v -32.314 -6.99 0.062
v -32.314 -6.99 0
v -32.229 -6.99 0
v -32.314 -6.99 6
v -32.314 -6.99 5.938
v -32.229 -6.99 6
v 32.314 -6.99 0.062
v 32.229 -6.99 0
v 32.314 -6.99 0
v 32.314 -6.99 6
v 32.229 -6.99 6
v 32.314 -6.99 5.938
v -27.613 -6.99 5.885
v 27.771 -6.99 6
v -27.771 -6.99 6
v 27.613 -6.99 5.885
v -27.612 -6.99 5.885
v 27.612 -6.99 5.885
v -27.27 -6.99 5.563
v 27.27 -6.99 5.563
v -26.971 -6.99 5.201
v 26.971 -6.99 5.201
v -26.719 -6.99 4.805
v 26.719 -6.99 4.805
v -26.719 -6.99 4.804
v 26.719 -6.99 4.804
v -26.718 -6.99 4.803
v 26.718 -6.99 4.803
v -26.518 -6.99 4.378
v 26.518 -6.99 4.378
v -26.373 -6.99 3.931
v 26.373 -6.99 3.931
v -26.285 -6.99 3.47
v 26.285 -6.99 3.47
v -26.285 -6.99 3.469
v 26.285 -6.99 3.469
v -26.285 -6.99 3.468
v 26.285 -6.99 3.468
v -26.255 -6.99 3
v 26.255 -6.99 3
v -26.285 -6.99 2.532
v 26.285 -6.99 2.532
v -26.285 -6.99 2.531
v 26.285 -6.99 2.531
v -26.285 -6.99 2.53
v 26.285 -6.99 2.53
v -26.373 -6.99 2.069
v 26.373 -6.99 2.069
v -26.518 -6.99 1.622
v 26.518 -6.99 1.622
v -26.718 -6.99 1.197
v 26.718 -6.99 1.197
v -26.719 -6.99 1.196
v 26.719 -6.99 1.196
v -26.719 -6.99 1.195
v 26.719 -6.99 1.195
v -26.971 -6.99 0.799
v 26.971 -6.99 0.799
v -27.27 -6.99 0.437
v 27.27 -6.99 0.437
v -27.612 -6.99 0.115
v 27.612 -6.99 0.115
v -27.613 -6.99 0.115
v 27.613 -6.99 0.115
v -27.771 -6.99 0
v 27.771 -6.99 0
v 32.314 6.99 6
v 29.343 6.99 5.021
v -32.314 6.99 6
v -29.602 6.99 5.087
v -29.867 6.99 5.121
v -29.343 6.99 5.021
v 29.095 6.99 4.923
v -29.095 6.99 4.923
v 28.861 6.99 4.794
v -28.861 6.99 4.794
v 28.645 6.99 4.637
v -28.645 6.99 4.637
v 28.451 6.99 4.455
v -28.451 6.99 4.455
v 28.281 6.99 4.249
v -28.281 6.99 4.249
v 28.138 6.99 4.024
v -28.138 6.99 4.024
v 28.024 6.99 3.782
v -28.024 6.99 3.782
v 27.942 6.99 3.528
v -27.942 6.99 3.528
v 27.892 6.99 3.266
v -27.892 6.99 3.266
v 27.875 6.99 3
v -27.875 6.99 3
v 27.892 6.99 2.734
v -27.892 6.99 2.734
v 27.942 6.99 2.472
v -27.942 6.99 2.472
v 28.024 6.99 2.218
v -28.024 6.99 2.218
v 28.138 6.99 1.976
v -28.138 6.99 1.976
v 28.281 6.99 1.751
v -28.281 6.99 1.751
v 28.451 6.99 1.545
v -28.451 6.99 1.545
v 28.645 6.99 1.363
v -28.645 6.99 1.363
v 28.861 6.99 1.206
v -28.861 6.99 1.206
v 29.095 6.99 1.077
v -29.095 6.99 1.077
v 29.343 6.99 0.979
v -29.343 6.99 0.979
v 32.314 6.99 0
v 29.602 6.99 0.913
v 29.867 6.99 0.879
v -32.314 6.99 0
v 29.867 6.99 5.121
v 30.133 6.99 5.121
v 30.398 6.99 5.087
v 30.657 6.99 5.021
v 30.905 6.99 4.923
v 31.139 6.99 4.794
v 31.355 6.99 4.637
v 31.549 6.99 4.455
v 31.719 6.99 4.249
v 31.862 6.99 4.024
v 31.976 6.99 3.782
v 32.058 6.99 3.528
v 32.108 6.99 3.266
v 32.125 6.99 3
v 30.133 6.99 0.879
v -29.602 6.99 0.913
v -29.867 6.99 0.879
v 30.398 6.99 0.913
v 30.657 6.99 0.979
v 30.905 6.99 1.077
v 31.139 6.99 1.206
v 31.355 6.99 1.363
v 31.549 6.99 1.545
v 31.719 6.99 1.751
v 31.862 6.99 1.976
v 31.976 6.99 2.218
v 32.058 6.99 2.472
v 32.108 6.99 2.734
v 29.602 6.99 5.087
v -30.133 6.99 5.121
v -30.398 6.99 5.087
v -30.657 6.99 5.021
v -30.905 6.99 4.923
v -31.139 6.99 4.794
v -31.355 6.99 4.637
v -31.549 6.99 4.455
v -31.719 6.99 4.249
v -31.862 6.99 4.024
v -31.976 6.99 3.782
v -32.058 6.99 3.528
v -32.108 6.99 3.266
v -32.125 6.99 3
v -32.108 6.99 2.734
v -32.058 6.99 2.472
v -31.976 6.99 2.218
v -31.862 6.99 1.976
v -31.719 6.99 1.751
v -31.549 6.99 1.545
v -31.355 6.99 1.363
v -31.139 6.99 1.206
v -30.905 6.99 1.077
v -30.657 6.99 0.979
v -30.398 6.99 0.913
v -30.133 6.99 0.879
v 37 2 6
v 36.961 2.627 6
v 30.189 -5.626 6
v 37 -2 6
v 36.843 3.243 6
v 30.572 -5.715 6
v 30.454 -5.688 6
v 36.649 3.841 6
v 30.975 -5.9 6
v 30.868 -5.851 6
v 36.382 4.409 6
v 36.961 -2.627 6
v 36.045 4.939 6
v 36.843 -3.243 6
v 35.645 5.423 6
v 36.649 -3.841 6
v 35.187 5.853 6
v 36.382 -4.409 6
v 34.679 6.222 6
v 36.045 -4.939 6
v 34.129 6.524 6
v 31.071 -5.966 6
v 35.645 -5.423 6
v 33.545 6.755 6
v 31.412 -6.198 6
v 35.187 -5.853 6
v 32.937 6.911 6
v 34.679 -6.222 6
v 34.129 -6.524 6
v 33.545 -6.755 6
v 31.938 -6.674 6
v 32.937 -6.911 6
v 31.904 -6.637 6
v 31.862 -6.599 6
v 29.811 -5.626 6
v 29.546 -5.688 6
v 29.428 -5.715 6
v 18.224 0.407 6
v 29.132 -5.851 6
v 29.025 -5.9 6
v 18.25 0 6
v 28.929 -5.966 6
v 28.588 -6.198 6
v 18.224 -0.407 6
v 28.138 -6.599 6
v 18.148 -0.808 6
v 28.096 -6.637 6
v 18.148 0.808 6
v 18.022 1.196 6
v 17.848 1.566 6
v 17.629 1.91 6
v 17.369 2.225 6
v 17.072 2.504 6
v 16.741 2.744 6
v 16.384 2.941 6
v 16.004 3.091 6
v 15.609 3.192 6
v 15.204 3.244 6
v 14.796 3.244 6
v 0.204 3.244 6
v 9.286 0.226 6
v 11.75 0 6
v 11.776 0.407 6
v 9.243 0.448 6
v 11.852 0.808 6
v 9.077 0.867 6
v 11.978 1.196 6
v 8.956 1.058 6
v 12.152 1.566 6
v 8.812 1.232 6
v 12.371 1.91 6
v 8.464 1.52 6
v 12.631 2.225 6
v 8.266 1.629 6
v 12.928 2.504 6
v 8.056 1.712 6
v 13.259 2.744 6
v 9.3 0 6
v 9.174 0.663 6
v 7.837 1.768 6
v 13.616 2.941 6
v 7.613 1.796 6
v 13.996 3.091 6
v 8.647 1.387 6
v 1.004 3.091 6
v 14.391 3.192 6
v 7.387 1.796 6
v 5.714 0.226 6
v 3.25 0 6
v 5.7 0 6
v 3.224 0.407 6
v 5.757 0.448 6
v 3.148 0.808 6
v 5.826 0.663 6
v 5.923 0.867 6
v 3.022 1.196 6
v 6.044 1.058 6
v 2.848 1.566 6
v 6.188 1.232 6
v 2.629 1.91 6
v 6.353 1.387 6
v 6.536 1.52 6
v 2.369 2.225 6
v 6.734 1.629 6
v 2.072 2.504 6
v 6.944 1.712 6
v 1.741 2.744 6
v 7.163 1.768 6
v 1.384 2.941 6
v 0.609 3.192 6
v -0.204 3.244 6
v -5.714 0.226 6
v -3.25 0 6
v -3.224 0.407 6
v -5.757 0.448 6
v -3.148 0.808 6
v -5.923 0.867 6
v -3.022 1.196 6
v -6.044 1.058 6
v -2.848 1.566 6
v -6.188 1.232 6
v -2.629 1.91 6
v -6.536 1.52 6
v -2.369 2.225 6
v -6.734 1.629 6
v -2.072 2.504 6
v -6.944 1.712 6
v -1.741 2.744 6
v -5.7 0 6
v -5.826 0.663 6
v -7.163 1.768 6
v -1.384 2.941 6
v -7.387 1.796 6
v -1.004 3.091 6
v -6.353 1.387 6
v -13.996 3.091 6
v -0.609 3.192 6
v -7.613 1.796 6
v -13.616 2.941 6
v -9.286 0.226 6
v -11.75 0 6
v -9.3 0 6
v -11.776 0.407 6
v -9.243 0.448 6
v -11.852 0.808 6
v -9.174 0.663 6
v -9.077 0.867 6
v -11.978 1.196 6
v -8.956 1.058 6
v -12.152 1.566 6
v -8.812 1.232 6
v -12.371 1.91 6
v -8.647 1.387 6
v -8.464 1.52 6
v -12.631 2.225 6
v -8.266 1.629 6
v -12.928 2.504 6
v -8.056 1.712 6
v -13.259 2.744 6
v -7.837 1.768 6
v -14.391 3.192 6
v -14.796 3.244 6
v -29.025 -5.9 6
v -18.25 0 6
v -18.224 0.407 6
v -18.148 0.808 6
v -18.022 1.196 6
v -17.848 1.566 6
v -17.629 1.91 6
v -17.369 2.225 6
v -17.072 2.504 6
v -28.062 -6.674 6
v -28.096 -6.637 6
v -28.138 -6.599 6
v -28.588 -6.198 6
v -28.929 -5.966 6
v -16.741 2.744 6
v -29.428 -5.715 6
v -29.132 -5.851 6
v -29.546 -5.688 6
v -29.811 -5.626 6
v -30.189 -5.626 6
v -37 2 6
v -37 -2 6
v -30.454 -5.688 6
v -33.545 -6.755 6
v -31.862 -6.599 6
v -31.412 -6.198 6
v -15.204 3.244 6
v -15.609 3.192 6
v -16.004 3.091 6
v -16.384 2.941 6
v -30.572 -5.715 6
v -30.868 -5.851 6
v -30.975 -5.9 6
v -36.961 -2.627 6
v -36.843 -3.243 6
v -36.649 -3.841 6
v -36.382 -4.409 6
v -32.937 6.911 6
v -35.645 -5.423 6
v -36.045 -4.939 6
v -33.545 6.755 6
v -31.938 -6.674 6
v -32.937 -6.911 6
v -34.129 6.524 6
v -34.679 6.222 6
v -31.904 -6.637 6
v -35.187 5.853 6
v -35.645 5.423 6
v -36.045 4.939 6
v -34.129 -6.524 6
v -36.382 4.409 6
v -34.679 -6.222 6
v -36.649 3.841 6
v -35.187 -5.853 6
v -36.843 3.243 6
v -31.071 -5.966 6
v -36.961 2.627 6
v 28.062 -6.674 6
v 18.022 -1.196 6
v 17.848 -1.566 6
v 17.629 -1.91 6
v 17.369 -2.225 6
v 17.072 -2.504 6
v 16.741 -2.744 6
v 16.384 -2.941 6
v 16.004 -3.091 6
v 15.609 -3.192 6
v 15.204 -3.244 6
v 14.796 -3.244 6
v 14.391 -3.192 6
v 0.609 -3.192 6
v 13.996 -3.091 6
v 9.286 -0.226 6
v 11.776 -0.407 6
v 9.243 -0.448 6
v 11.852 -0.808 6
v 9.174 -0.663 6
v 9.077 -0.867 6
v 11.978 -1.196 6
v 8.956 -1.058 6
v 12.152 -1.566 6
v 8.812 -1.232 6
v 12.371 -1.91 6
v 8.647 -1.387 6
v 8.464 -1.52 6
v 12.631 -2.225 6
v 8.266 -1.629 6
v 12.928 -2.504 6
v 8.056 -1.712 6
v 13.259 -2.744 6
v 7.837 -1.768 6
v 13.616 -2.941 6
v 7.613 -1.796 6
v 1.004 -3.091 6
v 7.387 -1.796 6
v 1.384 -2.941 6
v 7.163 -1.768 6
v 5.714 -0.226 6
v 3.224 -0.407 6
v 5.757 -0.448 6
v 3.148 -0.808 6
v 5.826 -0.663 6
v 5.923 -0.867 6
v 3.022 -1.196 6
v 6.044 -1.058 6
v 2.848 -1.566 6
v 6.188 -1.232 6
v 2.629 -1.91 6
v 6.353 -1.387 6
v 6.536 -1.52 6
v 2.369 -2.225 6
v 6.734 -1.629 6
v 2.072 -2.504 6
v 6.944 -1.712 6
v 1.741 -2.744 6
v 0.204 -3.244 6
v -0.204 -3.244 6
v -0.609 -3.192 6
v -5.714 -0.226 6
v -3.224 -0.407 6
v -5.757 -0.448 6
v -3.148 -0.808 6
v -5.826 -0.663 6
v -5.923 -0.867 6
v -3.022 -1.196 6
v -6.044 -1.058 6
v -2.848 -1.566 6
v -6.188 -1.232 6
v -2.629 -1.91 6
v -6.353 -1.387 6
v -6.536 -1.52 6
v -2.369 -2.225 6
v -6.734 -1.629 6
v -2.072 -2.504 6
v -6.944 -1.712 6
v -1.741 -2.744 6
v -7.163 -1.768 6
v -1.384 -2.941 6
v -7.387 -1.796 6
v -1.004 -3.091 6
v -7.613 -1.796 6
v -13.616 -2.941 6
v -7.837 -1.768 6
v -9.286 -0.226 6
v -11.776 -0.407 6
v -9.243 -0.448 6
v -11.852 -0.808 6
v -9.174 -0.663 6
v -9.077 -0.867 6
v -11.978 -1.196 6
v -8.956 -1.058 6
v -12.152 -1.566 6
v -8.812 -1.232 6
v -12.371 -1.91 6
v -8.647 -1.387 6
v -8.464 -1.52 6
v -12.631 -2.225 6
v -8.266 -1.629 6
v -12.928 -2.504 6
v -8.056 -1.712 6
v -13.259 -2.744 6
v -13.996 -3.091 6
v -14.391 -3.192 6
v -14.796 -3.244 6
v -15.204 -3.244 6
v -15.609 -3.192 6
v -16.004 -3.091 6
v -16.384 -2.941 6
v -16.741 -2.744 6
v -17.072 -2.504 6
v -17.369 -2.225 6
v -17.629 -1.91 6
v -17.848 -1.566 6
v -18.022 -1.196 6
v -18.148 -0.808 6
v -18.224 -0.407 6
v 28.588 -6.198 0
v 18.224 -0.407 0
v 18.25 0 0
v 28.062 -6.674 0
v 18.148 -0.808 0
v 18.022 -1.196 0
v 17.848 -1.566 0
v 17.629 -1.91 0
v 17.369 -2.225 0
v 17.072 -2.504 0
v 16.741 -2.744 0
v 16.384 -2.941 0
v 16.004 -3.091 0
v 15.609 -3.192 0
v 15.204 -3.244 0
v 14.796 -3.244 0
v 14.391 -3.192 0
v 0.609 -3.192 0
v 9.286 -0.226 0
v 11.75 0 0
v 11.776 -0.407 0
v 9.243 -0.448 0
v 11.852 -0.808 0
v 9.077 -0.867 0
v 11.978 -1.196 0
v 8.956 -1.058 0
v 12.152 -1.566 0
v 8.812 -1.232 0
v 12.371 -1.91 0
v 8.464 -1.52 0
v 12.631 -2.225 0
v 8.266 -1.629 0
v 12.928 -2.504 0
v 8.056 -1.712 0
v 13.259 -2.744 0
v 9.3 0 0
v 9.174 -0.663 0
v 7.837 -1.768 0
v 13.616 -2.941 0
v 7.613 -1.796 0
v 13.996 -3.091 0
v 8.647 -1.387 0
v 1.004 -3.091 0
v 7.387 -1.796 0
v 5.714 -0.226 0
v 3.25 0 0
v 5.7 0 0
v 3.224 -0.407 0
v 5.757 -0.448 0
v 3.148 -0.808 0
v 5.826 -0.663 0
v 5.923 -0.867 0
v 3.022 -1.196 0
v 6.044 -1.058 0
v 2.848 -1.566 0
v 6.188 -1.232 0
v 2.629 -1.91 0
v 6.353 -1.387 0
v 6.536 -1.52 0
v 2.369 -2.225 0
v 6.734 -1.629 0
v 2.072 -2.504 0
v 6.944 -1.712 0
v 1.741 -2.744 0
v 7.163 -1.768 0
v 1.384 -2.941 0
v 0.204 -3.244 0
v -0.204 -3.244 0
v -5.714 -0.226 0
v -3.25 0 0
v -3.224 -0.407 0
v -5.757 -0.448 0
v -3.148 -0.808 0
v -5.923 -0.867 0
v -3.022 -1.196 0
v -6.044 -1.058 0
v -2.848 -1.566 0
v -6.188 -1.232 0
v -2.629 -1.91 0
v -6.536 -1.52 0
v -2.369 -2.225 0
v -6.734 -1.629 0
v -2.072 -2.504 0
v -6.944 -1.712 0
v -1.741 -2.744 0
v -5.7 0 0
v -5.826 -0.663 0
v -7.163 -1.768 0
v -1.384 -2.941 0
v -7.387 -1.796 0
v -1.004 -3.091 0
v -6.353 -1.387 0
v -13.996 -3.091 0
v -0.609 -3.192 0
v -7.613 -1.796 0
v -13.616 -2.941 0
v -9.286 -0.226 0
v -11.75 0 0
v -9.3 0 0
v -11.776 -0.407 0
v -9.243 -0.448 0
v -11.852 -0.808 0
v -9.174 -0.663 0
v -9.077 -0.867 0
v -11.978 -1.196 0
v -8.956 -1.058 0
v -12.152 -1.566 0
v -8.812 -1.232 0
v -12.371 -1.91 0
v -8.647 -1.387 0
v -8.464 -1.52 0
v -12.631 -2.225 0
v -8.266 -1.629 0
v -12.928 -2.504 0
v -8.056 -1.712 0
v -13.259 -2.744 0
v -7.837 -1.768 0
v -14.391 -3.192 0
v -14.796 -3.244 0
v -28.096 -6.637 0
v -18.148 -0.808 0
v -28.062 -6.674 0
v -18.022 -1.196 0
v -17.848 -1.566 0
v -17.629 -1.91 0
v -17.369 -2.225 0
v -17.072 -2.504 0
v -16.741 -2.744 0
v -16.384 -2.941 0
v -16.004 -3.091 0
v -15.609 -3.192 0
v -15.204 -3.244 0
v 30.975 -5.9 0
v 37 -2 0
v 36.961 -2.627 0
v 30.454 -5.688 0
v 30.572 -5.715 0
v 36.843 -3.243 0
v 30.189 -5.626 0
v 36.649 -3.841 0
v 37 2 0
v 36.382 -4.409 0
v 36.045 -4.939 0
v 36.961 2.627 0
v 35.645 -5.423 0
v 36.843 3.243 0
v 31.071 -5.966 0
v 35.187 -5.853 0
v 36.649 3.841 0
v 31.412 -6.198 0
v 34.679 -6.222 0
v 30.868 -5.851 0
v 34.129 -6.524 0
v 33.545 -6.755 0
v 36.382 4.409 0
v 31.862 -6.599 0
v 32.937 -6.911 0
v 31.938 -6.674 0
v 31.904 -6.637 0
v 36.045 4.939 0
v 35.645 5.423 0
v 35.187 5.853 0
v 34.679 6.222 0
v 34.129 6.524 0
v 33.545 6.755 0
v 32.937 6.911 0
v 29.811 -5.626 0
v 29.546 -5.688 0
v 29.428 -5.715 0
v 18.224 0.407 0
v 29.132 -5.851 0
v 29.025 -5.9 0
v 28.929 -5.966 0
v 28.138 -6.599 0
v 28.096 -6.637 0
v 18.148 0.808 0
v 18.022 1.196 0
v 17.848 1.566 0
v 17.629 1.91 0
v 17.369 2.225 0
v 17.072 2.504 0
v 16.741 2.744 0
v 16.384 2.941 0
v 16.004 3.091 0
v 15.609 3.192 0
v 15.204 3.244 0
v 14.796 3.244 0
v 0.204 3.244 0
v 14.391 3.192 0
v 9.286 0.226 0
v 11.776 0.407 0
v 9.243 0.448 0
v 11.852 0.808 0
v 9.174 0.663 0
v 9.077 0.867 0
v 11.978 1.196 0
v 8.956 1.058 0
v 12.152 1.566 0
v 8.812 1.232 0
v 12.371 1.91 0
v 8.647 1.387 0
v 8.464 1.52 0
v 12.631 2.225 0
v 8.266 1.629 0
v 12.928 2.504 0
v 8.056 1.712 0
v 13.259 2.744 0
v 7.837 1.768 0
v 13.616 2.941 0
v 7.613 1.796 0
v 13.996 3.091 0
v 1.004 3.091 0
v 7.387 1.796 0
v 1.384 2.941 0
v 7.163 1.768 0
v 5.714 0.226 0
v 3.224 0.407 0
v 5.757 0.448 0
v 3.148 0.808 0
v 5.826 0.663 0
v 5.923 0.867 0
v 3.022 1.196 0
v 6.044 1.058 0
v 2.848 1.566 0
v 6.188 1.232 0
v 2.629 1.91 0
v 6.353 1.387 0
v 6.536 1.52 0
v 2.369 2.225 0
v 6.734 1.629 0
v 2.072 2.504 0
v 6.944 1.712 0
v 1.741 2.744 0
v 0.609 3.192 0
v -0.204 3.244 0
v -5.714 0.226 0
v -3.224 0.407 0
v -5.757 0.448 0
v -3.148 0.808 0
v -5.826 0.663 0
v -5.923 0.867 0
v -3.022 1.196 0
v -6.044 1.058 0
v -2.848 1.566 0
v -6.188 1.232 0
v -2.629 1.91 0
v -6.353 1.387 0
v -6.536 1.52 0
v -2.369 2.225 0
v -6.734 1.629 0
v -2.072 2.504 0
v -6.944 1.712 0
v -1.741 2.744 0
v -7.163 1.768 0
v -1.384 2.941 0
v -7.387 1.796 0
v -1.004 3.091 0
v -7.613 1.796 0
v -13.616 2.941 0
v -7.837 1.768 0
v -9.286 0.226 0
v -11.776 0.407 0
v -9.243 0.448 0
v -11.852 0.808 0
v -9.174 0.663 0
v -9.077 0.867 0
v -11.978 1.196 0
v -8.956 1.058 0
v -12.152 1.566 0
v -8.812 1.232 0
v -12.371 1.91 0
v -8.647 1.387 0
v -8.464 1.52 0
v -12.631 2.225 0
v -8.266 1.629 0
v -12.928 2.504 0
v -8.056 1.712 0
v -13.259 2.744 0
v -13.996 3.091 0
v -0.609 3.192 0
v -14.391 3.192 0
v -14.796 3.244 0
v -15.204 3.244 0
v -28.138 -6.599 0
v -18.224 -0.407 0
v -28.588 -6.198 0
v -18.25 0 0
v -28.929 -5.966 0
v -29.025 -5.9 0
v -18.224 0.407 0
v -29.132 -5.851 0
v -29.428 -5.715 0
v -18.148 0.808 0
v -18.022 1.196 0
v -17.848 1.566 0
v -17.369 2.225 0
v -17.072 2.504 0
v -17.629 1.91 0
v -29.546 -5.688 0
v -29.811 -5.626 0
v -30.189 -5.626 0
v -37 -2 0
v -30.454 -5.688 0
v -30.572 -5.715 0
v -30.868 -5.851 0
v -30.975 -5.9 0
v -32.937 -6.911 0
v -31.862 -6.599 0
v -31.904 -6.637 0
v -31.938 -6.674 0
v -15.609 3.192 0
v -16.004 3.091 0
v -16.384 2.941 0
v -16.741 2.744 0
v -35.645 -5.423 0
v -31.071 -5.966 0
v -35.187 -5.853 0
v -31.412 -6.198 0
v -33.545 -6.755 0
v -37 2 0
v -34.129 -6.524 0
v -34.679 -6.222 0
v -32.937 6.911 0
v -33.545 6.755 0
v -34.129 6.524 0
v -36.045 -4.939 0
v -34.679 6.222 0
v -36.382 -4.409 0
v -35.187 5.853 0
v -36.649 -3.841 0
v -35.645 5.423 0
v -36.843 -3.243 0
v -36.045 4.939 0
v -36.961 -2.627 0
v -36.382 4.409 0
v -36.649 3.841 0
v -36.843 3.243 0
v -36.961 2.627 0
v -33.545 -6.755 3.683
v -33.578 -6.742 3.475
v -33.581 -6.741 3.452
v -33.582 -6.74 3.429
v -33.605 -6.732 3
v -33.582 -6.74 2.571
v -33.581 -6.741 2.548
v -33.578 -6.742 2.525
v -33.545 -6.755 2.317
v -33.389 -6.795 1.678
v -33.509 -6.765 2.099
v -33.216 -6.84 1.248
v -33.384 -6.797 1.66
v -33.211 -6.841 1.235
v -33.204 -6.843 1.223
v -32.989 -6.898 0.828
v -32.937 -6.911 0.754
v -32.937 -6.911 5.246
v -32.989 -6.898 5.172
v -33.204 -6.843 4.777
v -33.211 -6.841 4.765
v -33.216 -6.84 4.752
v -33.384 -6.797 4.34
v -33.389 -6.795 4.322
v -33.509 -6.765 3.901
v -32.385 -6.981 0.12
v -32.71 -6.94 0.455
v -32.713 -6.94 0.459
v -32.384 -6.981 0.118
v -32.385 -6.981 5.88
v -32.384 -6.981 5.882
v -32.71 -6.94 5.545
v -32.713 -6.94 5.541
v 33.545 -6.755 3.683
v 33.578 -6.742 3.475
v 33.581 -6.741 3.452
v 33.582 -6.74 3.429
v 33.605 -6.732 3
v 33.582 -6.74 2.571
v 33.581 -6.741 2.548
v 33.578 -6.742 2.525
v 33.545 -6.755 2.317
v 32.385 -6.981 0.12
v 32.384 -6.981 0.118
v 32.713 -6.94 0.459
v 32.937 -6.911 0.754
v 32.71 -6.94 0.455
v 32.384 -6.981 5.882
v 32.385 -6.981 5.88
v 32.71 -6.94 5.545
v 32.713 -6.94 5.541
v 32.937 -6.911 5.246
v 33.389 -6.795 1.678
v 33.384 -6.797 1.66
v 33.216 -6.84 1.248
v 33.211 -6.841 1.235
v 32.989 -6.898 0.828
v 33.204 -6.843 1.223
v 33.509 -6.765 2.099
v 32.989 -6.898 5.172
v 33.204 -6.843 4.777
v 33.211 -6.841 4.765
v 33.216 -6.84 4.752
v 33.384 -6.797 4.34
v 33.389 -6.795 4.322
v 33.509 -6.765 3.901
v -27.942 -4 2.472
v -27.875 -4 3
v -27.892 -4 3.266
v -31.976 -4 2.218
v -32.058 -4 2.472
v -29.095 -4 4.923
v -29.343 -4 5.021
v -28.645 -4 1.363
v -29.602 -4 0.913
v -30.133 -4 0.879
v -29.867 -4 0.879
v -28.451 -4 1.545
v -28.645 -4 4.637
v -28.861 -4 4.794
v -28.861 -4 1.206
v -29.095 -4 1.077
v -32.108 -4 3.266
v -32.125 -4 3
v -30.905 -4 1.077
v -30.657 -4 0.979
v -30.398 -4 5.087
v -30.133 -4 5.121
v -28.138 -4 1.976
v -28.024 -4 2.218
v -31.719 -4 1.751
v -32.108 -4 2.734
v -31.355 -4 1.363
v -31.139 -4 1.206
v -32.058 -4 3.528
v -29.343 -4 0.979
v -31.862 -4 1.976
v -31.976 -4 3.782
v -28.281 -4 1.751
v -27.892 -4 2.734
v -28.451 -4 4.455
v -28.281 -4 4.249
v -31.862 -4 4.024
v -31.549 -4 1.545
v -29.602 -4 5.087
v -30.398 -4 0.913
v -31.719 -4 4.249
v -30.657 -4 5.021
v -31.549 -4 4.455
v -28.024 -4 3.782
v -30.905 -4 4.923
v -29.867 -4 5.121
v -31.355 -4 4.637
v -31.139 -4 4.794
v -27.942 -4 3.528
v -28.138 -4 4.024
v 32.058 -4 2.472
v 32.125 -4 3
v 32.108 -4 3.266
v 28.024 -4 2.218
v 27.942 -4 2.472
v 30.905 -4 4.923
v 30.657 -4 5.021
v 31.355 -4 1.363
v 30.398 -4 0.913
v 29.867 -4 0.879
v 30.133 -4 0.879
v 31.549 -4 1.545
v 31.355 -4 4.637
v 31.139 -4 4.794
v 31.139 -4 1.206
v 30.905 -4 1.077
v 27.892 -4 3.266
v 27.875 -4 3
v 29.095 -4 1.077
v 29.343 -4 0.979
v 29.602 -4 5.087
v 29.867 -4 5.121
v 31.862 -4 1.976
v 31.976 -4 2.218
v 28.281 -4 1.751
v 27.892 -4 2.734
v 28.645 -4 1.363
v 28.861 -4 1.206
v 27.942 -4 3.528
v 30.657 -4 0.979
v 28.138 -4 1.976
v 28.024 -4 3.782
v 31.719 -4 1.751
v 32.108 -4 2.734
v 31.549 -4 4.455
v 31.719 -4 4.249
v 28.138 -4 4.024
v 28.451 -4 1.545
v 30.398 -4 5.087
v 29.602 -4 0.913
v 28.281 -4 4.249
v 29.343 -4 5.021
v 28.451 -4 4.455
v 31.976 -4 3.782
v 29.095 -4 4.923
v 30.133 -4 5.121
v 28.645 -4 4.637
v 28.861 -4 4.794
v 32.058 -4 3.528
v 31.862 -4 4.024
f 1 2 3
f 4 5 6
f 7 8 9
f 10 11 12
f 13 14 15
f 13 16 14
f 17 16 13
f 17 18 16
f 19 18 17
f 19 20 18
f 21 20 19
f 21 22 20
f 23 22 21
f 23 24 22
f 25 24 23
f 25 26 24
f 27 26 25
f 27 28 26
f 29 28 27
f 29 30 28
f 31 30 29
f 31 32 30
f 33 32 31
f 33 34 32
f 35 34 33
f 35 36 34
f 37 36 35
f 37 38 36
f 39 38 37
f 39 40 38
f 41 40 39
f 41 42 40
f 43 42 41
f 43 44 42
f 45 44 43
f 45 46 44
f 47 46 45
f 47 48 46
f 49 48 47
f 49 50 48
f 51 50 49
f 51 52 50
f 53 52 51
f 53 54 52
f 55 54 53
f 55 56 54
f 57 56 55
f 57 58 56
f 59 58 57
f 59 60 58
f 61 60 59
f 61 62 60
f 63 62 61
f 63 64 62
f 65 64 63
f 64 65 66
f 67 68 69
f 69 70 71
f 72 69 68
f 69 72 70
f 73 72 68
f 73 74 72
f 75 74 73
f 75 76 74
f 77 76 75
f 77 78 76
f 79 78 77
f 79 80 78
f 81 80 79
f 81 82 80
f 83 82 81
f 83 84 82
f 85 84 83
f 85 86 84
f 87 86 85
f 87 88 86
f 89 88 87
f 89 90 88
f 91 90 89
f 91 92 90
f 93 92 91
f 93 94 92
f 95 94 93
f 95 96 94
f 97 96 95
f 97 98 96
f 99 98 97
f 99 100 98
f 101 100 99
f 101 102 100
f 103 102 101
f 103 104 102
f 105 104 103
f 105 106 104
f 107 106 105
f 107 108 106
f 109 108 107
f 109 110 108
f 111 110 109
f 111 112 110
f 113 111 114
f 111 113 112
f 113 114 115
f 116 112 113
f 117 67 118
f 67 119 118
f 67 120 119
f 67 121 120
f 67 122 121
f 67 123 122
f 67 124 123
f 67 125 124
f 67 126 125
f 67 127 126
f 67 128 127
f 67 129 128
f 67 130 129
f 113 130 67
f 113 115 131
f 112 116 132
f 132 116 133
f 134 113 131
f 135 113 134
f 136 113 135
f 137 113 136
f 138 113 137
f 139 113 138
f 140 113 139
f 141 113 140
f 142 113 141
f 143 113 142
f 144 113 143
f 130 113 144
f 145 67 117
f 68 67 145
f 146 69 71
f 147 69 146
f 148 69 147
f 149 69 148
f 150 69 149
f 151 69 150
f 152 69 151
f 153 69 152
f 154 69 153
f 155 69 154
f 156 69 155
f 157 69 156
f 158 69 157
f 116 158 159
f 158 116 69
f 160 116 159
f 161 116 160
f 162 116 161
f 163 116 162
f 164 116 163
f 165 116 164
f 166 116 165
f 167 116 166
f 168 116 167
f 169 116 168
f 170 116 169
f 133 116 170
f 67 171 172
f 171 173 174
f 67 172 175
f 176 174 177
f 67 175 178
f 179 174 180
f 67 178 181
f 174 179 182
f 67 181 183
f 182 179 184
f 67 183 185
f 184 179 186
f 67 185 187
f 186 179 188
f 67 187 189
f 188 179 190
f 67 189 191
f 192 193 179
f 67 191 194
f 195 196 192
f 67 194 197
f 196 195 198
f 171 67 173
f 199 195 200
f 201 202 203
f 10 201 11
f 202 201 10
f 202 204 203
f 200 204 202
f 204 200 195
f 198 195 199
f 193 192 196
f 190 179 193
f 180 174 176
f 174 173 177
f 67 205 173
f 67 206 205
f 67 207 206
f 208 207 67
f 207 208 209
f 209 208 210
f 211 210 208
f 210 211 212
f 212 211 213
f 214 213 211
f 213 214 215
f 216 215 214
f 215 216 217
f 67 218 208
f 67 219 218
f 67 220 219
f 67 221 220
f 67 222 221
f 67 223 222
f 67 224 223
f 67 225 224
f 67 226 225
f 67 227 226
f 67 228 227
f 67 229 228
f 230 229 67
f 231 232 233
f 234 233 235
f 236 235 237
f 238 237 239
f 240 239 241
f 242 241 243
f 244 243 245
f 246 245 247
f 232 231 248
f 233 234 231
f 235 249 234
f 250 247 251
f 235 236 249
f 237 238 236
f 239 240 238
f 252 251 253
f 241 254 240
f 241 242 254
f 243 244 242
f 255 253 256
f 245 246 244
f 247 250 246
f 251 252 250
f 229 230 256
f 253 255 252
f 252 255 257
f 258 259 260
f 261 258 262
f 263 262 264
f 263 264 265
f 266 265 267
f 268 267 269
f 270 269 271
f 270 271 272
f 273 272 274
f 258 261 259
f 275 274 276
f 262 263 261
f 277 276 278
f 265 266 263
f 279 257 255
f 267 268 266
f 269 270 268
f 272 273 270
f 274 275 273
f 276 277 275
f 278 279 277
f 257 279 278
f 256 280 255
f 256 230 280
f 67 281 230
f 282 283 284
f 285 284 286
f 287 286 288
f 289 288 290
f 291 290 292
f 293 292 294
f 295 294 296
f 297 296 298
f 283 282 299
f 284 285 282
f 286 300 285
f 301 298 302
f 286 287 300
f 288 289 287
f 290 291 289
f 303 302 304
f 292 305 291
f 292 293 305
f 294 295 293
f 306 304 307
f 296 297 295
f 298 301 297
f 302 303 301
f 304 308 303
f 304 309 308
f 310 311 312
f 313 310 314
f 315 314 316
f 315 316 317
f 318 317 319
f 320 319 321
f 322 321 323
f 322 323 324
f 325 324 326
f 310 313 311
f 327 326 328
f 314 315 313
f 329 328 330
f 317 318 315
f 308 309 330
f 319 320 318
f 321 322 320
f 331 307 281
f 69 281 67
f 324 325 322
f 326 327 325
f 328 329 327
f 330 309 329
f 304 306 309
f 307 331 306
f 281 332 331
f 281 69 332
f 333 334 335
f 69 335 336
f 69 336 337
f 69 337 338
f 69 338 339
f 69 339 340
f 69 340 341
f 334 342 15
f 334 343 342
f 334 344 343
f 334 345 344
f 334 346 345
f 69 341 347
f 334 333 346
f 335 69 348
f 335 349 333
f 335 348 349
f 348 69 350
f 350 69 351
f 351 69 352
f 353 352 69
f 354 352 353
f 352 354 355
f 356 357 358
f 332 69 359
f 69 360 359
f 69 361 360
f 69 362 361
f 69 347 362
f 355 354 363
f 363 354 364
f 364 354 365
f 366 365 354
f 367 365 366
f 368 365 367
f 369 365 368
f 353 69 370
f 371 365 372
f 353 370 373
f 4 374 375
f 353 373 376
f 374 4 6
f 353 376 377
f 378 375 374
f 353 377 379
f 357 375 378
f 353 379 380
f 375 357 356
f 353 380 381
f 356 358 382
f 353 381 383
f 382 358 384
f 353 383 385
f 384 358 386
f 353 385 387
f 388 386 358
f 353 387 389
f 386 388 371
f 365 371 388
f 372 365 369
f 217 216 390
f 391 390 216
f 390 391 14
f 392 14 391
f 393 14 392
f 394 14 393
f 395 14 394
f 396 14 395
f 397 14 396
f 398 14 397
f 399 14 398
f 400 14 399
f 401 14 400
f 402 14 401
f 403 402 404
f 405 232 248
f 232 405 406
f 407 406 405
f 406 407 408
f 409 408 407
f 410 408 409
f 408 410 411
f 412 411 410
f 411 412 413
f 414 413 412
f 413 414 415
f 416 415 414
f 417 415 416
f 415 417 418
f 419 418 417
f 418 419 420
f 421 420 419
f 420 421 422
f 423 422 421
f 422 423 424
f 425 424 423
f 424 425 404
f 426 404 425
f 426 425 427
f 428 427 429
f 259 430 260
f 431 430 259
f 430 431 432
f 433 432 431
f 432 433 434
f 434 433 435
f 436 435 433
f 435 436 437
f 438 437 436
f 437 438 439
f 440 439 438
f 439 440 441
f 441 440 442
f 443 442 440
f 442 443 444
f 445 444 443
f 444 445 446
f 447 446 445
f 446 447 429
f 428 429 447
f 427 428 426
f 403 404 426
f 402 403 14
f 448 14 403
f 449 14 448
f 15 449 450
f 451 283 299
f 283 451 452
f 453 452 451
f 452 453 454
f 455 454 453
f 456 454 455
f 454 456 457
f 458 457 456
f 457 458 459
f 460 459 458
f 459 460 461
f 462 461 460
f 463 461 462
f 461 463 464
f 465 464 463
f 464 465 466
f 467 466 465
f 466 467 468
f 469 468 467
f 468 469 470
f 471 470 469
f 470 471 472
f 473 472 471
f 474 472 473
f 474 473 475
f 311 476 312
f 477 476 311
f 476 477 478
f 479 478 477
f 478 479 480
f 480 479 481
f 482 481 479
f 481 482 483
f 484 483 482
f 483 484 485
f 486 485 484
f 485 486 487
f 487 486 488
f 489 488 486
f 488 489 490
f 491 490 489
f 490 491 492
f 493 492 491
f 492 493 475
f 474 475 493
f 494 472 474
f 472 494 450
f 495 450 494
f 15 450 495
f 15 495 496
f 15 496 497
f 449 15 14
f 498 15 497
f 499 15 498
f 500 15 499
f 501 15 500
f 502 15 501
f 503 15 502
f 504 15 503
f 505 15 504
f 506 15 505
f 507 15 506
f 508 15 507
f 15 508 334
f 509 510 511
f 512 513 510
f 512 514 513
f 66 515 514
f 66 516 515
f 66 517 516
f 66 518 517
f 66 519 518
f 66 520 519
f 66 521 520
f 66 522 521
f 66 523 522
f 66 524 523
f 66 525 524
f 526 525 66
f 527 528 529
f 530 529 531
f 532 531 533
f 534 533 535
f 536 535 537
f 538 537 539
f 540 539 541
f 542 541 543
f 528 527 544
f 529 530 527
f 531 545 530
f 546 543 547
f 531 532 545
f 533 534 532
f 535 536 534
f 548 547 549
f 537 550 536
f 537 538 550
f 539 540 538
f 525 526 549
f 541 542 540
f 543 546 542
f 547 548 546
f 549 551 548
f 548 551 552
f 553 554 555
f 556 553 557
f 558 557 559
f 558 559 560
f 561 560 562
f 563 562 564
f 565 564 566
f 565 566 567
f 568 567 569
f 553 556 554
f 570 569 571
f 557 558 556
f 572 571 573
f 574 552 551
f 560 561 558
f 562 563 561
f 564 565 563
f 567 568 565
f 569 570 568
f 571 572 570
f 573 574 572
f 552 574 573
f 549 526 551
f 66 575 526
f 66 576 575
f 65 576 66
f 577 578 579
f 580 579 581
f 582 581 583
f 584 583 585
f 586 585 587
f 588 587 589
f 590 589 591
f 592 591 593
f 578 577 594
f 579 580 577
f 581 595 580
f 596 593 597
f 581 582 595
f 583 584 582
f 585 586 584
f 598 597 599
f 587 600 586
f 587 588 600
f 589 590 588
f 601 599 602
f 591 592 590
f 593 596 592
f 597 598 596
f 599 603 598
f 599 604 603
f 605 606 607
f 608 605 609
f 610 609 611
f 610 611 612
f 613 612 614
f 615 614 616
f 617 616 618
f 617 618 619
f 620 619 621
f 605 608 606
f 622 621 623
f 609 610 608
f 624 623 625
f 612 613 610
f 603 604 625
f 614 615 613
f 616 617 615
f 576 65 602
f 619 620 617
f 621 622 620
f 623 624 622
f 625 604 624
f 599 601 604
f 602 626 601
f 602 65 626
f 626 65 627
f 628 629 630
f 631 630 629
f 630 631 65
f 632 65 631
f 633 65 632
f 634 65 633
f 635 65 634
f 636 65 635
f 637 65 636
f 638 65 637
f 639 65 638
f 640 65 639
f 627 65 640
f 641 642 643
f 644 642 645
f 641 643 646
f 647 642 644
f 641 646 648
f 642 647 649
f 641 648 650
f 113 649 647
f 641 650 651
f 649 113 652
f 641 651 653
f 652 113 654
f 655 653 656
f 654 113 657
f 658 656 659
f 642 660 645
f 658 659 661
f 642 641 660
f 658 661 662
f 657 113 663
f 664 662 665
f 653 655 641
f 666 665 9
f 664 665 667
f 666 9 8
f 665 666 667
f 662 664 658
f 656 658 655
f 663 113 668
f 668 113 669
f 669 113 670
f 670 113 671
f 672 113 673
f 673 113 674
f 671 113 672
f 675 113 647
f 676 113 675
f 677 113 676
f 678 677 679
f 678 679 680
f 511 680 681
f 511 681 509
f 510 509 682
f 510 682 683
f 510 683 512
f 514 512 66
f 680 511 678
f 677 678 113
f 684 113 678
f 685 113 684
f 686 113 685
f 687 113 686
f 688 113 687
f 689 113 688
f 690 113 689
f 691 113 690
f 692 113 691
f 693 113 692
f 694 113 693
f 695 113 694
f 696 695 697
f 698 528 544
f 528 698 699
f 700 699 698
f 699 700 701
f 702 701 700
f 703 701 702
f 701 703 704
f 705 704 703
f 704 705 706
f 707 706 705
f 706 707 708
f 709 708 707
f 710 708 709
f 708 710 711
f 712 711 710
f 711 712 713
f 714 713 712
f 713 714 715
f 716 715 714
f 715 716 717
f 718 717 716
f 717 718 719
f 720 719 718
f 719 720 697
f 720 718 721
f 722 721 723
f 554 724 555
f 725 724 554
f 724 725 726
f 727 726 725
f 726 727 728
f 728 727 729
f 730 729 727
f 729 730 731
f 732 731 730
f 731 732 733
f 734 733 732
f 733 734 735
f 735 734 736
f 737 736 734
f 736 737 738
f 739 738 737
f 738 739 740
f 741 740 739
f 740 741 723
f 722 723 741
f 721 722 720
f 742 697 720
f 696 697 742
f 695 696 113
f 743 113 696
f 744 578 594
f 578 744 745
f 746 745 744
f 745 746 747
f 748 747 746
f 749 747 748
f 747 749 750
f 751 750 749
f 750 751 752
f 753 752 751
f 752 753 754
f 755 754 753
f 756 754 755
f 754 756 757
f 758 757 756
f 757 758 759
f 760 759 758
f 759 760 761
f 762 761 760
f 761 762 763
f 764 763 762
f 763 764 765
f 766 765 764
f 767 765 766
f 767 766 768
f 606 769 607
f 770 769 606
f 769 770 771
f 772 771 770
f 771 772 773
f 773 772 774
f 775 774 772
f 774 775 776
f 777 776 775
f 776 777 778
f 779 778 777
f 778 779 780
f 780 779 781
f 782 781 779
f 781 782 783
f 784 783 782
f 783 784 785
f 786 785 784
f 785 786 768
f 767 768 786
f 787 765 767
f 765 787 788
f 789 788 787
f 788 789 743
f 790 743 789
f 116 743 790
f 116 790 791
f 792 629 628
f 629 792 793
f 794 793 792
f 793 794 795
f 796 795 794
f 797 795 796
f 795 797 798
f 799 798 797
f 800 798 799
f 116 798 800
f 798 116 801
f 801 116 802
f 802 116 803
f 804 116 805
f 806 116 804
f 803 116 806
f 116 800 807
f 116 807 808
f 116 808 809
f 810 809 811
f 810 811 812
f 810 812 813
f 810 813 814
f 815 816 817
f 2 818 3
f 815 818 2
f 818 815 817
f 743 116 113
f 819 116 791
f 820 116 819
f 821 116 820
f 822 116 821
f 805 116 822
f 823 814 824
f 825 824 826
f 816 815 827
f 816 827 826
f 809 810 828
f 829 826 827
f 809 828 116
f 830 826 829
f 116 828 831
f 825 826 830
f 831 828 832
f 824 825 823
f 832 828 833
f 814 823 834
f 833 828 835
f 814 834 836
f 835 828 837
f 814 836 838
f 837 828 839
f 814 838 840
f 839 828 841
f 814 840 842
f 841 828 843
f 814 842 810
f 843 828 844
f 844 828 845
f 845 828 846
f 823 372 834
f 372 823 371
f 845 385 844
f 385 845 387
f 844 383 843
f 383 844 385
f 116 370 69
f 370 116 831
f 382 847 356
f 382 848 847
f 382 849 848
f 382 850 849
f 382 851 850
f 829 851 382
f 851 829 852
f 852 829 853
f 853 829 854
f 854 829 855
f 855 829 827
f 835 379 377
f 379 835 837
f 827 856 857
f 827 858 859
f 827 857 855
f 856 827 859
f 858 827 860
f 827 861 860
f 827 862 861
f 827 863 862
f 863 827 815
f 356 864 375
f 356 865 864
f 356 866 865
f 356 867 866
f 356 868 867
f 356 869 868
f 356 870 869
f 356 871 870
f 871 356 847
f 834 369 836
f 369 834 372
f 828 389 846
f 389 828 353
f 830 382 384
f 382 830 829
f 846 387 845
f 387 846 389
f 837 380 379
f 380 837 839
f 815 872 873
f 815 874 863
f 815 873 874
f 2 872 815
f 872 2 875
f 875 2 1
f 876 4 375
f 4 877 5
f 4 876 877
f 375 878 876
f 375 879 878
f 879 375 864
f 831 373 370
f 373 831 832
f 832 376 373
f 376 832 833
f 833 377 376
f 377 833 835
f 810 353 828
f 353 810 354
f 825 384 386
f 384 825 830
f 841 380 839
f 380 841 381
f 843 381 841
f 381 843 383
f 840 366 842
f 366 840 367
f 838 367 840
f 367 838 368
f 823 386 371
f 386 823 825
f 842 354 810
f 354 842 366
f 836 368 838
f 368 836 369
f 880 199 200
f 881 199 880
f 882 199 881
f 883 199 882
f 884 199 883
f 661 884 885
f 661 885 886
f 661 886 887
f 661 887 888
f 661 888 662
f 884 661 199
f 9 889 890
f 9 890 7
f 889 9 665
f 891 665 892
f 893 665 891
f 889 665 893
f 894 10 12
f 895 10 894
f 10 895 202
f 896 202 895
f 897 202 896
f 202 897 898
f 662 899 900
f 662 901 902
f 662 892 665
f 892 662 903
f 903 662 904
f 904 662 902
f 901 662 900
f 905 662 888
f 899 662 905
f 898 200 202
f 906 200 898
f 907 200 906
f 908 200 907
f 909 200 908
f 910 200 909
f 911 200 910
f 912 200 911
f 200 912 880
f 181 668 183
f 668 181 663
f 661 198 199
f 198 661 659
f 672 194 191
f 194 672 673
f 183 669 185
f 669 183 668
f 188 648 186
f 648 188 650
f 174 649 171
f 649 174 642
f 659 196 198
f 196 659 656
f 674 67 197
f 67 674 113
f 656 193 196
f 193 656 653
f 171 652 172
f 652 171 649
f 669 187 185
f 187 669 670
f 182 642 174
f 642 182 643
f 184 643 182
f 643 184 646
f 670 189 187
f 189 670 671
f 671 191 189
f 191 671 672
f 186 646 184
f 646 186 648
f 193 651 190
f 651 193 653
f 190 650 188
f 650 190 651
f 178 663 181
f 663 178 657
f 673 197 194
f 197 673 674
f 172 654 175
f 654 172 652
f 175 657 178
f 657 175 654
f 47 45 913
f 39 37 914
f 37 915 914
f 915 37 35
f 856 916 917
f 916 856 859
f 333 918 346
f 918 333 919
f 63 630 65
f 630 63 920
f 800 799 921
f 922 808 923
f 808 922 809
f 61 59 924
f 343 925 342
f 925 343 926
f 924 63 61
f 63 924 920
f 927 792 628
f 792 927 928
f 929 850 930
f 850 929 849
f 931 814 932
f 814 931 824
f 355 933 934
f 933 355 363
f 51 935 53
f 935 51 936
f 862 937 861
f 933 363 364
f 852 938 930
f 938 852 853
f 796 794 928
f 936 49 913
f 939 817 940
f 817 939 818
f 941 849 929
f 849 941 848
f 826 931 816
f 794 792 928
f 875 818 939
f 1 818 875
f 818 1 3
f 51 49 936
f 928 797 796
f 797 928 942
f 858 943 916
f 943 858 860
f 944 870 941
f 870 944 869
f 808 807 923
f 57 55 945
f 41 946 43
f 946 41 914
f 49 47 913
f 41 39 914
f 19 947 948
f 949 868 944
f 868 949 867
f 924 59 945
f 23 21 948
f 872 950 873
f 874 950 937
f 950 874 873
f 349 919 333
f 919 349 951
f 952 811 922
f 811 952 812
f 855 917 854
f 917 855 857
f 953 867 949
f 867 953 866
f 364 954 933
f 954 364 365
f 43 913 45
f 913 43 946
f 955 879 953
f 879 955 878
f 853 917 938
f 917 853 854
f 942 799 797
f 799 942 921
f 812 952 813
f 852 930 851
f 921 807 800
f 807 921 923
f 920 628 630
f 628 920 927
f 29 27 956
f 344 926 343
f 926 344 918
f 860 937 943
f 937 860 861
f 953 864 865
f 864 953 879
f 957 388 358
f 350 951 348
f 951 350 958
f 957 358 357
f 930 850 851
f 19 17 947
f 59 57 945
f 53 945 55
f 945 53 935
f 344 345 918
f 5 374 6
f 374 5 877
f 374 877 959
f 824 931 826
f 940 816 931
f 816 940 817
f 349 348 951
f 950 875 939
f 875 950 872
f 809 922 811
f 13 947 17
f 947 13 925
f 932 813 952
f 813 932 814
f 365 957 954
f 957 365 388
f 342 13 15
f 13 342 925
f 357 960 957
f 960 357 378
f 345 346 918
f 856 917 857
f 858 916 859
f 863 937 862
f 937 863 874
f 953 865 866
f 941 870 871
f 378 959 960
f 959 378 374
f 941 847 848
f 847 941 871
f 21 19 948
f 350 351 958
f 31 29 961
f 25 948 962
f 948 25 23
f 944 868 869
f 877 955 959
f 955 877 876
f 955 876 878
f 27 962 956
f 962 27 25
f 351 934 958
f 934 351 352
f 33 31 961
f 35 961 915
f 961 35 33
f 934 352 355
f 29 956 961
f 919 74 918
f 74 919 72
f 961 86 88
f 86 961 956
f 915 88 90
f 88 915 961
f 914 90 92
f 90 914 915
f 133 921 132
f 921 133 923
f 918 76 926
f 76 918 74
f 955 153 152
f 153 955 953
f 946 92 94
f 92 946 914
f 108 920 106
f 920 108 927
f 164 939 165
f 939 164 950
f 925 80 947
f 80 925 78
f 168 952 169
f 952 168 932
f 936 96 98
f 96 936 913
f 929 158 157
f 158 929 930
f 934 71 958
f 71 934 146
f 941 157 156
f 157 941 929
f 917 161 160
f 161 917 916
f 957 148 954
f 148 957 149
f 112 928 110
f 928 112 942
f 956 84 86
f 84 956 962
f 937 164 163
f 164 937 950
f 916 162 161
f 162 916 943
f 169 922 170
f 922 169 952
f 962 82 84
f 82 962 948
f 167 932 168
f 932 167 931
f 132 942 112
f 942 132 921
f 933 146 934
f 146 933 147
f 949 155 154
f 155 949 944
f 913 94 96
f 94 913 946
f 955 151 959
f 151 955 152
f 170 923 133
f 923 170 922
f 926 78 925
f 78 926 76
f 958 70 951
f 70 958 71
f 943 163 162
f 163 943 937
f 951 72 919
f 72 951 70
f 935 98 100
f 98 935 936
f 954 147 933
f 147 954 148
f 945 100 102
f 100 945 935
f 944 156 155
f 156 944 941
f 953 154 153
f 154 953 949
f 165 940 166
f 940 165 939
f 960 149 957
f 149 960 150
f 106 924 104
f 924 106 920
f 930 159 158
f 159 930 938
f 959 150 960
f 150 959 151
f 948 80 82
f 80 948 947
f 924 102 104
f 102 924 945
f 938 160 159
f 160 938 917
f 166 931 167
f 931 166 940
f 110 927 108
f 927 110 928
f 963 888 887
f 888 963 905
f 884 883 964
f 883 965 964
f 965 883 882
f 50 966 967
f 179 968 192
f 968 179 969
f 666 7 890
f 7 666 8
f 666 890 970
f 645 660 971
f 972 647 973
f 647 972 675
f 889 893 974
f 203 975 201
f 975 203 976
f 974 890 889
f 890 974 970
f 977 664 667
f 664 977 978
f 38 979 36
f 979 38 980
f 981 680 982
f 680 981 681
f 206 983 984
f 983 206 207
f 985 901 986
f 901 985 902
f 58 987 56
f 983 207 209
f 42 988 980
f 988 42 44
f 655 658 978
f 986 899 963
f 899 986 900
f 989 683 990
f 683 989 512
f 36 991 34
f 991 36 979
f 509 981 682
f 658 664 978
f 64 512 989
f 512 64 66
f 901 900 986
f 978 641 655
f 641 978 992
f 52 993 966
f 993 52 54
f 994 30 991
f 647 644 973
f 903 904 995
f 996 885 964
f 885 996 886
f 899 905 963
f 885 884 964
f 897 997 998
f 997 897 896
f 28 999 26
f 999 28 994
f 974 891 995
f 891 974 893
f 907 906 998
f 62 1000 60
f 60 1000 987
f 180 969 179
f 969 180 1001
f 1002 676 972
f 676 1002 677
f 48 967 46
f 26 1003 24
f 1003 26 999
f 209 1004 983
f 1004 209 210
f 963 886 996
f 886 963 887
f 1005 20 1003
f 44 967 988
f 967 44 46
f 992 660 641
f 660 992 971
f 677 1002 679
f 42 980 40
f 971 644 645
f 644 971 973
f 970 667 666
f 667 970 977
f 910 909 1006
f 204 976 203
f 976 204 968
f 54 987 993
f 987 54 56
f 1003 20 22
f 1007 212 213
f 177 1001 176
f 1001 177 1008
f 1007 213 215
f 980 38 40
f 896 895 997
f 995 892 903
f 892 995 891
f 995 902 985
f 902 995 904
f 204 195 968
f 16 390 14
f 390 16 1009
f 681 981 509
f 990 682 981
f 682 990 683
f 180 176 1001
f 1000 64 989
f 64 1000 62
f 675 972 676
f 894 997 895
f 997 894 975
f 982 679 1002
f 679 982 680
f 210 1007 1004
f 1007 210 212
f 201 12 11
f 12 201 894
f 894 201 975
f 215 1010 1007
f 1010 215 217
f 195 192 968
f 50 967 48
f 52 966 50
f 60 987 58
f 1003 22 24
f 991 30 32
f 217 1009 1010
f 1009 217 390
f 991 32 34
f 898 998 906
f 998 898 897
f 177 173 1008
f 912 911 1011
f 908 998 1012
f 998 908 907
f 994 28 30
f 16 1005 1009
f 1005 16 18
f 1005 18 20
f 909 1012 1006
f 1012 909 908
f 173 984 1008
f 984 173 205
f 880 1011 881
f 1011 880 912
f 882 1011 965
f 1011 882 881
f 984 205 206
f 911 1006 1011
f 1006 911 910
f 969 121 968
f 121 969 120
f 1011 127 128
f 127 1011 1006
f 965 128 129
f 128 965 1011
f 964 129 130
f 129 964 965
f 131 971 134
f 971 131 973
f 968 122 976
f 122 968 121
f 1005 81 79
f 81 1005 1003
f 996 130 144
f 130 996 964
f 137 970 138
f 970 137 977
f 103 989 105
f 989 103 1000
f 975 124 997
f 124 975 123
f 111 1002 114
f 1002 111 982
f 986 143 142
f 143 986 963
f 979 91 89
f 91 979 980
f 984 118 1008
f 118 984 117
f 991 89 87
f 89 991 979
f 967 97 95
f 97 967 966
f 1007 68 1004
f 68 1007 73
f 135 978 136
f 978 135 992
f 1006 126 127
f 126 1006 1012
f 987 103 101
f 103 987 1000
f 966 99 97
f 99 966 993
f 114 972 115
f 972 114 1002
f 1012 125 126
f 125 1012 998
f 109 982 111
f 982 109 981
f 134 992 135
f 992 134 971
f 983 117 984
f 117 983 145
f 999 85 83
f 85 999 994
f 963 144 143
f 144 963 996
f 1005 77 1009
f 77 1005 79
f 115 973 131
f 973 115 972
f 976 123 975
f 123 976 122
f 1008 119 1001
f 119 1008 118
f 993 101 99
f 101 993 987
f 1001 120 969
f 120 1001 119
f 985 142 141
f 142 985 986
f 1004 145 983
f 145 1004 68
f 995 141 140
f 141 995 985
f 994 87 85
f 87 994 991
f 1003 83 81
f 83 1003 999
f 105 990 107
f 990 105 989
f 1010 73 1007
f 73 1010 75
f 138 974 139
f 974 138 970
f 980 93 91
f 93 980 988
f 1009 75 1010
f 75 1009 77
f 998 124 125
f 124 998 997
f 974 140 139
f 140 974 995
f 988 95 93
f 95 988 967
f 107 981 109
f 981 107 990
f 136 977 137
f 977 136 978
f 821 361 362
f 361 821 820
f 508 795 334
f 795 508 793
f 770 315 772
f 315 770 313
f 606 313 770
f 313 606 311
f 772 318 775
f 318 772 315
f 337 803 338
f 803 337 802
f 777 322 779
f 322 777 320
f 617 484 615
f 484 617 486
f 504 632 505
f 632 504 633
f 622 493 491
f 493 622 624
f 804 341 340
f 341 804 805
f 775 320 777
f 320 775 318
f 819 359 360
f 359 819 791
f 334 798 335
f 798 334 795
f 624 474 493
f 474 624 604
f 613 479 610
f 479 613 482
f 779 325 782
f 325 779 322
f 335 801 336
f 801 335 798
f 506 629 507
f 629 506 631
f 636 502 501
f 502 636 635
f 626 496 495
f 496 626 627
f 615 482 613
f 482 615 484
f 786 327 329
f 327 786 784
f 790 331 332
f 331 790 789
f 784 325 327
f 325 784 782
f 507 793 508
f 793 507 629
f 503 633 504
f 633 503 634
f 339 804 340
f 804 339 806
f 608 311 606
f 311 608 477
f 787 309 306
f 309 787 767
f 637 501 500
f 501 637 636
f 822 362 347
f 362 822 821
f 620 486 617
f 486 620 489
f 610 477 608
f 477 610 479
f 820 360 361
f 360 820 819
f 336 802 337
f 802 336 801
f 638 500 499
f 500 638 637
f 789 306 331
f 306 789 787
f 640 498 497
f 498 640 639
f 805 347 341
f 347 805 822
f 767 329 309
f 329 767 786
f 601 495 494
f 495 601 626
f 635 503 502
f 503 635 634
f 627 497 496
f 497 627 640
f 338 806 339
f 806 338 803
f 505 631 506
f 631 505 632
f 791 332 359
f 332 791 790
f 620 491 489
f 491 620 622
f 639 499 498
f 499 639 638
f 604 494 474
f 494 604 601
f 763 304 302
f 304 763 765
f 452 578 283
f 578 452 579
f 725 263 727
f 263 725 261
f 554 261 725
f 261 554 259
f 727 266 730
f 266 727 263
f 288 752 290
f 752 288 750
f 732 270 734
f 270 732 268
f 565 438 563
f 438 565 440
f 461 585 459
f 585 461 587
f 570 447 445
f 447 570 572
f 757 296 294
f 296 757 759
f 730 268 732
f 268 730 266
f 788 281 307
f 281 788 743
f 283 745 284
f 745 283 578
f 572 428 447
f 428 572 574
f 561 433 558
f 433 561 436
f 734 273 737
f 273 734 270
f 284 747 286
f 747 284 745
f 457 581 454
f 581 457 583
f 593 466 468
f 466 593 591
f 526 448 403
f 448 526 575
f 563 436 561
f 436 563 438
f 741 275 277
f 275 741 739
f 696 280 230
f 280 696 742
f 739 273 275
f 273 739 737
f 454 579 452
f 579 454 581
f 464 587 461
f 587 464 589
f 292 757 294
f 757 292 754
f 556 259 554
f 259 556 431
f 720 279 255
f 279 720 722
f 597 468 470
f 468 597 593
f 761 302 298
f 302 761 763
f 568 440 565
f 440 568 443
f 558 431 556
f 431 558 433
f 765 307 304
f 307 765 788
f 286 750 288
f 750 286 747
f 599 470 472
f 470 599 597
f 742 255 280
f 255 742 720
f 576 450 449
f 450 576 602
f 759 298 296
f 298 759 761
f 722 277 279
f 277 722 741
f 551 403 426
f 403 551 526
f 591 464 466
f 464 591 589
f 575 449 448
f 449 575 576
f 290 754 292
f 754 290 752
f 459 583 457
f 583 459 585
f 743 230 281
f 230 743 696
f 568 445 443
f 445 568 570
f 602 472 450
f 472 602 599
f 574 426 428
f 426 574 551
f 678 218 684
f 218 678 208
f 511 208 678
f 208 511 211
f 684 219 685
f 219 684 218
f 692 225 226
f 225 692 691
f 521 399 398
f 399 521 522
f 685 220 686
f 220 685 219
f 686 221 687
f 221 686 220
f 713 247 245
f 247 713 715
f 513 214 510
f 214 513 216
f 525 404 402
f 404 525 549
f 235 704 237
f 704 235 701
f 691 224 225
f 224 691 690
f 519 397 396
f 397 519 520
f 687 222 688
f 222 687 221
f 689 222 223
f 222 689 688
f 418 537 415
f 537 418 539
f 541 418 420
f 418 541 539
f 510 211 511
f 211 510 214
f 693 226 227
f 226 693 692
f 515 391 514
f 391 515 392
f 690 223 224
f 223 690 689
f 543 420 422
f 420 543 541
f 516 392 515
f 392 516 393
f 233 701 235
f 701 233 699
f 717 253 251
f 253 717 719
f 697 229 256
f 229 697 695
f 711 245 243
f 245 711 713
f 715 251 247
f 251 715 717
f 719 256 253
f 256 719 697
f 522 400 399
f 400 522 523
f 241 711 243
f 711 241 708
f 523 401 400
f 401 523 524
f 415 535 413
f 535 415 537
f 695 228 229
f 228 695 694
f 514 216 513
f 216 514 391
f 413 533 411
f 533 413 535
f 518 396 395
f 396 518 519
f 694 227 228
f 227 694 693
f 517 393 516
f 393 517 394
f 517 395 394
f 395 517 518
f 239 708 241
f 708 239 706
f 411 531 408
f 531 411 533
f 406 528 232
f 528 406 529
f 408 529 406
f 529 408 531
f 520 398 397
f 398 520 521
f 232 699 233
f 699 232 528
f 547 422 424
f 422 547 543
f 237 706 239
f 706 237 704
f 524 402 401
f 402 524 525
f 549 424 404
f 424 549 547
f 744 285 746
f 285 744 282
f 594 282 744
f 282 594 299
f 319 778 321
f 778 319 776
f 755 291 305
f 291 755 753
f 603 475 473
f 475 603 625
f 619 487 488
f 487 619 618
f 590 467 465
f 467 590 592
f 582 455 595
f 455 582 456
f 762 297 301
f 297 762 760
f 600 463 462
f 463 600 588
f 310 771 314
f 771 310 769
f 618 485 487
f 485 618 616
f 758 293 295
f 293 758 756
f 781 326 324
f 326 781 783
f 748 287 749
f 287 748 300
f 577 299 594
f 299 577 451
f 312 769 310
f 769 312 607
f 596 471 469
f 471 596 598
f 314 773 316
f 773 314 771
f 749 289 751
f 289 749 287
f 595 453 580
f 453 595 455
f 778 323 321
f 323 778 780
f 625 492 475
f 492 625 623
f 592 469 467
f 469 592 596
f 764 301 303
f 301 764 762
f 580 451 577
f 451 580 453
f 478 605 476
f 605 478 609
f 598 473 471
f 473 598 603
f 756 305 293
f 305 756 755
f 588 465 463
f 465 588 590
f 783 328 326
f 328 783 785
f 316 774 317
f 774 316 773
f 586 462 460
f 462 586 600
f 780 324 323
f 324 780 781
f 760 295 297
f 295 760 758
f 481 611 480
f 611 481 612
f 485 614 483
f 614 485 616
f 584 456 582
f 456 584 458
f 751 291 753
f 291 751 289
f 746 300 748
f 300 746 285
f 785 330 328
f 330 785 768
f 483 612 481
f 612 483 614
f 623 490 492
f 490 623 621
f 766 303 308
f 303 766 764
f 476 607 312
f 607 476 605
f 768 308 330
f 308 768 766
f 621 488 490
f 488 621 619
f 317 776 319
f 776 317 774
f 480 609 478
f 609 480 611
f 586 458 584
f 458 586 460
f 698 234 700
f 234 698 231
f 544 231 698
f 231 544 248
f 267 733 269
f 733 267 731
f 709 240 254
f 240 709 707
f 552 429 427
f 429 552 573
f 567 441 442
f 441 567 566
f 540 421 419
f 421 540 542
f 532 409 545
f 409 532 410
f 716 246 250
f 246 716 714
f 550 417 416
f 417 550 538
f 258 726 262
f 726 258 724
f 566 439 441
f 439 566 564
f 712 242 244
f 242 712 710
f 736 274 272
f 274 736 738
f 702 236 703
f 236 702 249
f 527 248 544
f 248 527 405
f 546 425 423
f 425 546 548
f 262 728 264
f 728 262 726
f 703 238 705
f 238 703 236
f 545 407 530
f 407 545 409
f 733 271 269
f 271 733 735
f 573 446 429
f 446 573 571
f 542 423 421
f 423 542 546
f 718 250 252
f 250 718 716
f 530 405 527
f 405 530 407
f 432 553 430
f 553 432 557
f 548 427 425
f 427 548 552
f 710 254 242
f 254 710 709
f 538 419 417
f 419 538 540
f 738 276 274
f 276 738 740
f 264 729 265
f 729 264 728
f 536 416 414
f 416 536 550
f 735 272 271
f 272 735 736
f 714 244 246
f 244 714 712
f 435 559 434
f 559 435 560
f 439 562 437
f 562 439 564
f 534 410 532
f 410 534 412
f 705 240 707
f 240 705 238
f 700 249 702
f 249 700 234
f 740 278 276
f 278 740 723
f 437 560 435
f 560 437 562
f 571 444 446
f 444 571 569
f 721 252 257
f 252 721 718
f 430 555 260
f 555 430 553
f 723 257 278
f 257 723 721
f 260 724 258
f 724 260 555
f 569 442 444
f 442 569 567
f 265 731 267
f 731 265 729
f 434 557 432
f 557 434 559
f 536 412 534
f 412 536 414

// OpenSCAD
$fn = 50;


difference() {
	union() {
		hull() {
			translate(v = [-17.0000000000, 2.0000000000, 0]) {
				cylinder(h = 6, r = 5);
			}
			translate(v = [17.0000000000, 2.0000000000, 0]) {
				cylinder(h = 6, r = 5);
			}
			translate(v = [-17.0000000000, -2.0000000000, 0]) {
				cylinder(h = 6, r = 5);
			}
			translate(v = [17.0000000000, -2.0000000000, 0]) {
				cylinder(h = 6, r = 5);
			}
		}
		translate(v = [-22.5000000000, 0.0000000000, 0]) {
			hull() {
				translate(v = [-9.5000000000, 2.0000000000, 0]) {
					cylinder(h = 6, r = 5);
				}
				translate(v = [9.5000000000, 2.0000000000, 0]) {
					cylinder(h = 6, r = 5);
				}
				translate(v = [-9.5000000000, -2.0000000000, 0]) {
					cylinder(h = 6, r = 5);
				}
				translate(v = [9.5000000000, -2.0000000000, 0]) {
					cylinder(h = 6, r = 5);
				}
			}
		}
		translate(v = [-22.5000000000, 0.0000000000, 0]) {
			hull() {
				translate(v = [-9.5000000000, 2.0000000000, 0]) {
					cylinder(h = 6, r = 5);
				}
				translate(v = [9.5000000000, 2.0000000000, 0]) {
					cylinder(h = 6, r = 5);
				}
				translate(v = [-9.5000000000, -2.0000000000, 0]) {
					cylinder(h = 6, r = 5);
				}
				translate(v = [9.5000000000, -2.0000000000, 0]) {
					cylinder(h = 6, r = 5);
				}
			}
		}
		translate(v = [22.5000000000, 0.0000000000, 0]) {
			hull() {
				translate(v = [-9.5000000000, 2.0000000000, 0]) {
					cylinder(h = 6, r = 5);
				}
				translate(v = [9.5000000000, 2.0000000000, 0]) {
					cylinder(h = 6, r = 5);
				}
				translate(v = [-9.5000000000, -2.0000000000, 0]) {
					cylinder(h = 6, r = 5);
				}
				translate(v = [9.5000000000, -2.0000000000, 0]) {
					cylinder(h = 6, r = 5);
				}
			}
		}
		translate(v = [22.5000000000, 0.0000000000, 0]) {
			hull() {
				translate(v = [-9.5000000000, 2.0000000000, 0]) {
					cylinder(h = 6, r = 5);
				}
				translate(v = [9.5000000000, 2.0000000000, 0]) {
					cylinder(h = 6, r = 5);
				}
				translate(v = [-9.5000000000, -2.0000000000, 0]) {
					cylinder(h = 6, r = 5);
				}
				translate(v = [9.5000000000, -2.0000000000, 0]) {
					cylinder(h = 6, r = 5);
				}
			}
		}
	}
	union() {
		translate(v = [-30.0000000000, -7.0000000000, 3.0000000000]) {
			rotate(a = [90, 0, 0]) {
				difference() {
					union() {
						#translate(v = [0, 0, -14.0000000000]) {
							cylinder(h = 14, r = 2.0000000000);
						}
						#translate(v = [0, 0, -3]) {
							cylinder(h = 3, r1 = 2.1250000000, r2 = 3.7500000000);
						}
						#translate(v = [0, 0, -14.0000000000]) {
							cylinder(h = 14, r = 2.1250000000);
						}
						#translate(v = [0, 0, -14.0000000000]) {
							cylinder(h = 14, r = 2.0000000000);
						}
					}
					union();
				}
			}
		}
		translate(v = [30.0000000000, -7.0000000000, 3.0000000000]) {
			rotate(a = [90, 0, 0]) {
				difference() {
					union() {
						#translate(v = [0, 0, -14.0000000000]) {
							cylinder(h = 14, r = 2.0000000000);
						}
						#translate(v = [0, 0, -3]) {
							cylinder(h = 3, r1 = 2.1250000000, r2 = 3.7500000000);
						}
						#translate(v = [0, 0, -14.0000000000]) {
							cylinder(h = 14, r = 2.1250000000);
						}
						#translate(v = [0, 0, -14.0000000000]) {
							cylinder(h = 14, r = 2.0000000000);
						}
					}
					union();
				}
			}
		}
		translate(v = [-15.0000000000, 0.0000000000, 0]) {
			translate(v = [0, 0, -100]) {
				cylinder(h = 200, r = 3.2500000000);
			}
		}
		translate(v = [0, 0, -100]) {
			cylinder(h = 200, r = 3.2500000000);
		}
		translate(v = [15.0000000000, 0.0000000000, 0]) {
			translate(v = [0, 0, -100]) {
				cylinder(h = 200, r = 3.2500000000);
			}
		}
		translate(v = [-15.0000000000, 0.0000000000, 0]) {
			translate(v = [0, 0, -100]) {
				cylinder(h = 200, r = 1.8000000000);
			}
		}
		translate(v = [-7.5000000000, 0.0000000000, 0]) {
			translate(v = [0, 0, -100]) {
				cylinder(h = 200, r = 1.8000000000);
			}
		}
		translate(v = [0, 0, -100]) {
			cylinder(h = 200, r = 1.8000000000);
		}
		translate(v = [7.5000000000, 0.0000000000, 0]) {
			translate(v = [0, 0, -100]) {
				cylinder(h = 200, r = 1.8000000000);
			}
		}
		translate(v = [15.0000000000, 0.0000000000, 0]) {
			translate(v = [0, 0, -100]) {
				cylinder(h = 200, r = 1.8000000000);
			}
		}
	}
}
